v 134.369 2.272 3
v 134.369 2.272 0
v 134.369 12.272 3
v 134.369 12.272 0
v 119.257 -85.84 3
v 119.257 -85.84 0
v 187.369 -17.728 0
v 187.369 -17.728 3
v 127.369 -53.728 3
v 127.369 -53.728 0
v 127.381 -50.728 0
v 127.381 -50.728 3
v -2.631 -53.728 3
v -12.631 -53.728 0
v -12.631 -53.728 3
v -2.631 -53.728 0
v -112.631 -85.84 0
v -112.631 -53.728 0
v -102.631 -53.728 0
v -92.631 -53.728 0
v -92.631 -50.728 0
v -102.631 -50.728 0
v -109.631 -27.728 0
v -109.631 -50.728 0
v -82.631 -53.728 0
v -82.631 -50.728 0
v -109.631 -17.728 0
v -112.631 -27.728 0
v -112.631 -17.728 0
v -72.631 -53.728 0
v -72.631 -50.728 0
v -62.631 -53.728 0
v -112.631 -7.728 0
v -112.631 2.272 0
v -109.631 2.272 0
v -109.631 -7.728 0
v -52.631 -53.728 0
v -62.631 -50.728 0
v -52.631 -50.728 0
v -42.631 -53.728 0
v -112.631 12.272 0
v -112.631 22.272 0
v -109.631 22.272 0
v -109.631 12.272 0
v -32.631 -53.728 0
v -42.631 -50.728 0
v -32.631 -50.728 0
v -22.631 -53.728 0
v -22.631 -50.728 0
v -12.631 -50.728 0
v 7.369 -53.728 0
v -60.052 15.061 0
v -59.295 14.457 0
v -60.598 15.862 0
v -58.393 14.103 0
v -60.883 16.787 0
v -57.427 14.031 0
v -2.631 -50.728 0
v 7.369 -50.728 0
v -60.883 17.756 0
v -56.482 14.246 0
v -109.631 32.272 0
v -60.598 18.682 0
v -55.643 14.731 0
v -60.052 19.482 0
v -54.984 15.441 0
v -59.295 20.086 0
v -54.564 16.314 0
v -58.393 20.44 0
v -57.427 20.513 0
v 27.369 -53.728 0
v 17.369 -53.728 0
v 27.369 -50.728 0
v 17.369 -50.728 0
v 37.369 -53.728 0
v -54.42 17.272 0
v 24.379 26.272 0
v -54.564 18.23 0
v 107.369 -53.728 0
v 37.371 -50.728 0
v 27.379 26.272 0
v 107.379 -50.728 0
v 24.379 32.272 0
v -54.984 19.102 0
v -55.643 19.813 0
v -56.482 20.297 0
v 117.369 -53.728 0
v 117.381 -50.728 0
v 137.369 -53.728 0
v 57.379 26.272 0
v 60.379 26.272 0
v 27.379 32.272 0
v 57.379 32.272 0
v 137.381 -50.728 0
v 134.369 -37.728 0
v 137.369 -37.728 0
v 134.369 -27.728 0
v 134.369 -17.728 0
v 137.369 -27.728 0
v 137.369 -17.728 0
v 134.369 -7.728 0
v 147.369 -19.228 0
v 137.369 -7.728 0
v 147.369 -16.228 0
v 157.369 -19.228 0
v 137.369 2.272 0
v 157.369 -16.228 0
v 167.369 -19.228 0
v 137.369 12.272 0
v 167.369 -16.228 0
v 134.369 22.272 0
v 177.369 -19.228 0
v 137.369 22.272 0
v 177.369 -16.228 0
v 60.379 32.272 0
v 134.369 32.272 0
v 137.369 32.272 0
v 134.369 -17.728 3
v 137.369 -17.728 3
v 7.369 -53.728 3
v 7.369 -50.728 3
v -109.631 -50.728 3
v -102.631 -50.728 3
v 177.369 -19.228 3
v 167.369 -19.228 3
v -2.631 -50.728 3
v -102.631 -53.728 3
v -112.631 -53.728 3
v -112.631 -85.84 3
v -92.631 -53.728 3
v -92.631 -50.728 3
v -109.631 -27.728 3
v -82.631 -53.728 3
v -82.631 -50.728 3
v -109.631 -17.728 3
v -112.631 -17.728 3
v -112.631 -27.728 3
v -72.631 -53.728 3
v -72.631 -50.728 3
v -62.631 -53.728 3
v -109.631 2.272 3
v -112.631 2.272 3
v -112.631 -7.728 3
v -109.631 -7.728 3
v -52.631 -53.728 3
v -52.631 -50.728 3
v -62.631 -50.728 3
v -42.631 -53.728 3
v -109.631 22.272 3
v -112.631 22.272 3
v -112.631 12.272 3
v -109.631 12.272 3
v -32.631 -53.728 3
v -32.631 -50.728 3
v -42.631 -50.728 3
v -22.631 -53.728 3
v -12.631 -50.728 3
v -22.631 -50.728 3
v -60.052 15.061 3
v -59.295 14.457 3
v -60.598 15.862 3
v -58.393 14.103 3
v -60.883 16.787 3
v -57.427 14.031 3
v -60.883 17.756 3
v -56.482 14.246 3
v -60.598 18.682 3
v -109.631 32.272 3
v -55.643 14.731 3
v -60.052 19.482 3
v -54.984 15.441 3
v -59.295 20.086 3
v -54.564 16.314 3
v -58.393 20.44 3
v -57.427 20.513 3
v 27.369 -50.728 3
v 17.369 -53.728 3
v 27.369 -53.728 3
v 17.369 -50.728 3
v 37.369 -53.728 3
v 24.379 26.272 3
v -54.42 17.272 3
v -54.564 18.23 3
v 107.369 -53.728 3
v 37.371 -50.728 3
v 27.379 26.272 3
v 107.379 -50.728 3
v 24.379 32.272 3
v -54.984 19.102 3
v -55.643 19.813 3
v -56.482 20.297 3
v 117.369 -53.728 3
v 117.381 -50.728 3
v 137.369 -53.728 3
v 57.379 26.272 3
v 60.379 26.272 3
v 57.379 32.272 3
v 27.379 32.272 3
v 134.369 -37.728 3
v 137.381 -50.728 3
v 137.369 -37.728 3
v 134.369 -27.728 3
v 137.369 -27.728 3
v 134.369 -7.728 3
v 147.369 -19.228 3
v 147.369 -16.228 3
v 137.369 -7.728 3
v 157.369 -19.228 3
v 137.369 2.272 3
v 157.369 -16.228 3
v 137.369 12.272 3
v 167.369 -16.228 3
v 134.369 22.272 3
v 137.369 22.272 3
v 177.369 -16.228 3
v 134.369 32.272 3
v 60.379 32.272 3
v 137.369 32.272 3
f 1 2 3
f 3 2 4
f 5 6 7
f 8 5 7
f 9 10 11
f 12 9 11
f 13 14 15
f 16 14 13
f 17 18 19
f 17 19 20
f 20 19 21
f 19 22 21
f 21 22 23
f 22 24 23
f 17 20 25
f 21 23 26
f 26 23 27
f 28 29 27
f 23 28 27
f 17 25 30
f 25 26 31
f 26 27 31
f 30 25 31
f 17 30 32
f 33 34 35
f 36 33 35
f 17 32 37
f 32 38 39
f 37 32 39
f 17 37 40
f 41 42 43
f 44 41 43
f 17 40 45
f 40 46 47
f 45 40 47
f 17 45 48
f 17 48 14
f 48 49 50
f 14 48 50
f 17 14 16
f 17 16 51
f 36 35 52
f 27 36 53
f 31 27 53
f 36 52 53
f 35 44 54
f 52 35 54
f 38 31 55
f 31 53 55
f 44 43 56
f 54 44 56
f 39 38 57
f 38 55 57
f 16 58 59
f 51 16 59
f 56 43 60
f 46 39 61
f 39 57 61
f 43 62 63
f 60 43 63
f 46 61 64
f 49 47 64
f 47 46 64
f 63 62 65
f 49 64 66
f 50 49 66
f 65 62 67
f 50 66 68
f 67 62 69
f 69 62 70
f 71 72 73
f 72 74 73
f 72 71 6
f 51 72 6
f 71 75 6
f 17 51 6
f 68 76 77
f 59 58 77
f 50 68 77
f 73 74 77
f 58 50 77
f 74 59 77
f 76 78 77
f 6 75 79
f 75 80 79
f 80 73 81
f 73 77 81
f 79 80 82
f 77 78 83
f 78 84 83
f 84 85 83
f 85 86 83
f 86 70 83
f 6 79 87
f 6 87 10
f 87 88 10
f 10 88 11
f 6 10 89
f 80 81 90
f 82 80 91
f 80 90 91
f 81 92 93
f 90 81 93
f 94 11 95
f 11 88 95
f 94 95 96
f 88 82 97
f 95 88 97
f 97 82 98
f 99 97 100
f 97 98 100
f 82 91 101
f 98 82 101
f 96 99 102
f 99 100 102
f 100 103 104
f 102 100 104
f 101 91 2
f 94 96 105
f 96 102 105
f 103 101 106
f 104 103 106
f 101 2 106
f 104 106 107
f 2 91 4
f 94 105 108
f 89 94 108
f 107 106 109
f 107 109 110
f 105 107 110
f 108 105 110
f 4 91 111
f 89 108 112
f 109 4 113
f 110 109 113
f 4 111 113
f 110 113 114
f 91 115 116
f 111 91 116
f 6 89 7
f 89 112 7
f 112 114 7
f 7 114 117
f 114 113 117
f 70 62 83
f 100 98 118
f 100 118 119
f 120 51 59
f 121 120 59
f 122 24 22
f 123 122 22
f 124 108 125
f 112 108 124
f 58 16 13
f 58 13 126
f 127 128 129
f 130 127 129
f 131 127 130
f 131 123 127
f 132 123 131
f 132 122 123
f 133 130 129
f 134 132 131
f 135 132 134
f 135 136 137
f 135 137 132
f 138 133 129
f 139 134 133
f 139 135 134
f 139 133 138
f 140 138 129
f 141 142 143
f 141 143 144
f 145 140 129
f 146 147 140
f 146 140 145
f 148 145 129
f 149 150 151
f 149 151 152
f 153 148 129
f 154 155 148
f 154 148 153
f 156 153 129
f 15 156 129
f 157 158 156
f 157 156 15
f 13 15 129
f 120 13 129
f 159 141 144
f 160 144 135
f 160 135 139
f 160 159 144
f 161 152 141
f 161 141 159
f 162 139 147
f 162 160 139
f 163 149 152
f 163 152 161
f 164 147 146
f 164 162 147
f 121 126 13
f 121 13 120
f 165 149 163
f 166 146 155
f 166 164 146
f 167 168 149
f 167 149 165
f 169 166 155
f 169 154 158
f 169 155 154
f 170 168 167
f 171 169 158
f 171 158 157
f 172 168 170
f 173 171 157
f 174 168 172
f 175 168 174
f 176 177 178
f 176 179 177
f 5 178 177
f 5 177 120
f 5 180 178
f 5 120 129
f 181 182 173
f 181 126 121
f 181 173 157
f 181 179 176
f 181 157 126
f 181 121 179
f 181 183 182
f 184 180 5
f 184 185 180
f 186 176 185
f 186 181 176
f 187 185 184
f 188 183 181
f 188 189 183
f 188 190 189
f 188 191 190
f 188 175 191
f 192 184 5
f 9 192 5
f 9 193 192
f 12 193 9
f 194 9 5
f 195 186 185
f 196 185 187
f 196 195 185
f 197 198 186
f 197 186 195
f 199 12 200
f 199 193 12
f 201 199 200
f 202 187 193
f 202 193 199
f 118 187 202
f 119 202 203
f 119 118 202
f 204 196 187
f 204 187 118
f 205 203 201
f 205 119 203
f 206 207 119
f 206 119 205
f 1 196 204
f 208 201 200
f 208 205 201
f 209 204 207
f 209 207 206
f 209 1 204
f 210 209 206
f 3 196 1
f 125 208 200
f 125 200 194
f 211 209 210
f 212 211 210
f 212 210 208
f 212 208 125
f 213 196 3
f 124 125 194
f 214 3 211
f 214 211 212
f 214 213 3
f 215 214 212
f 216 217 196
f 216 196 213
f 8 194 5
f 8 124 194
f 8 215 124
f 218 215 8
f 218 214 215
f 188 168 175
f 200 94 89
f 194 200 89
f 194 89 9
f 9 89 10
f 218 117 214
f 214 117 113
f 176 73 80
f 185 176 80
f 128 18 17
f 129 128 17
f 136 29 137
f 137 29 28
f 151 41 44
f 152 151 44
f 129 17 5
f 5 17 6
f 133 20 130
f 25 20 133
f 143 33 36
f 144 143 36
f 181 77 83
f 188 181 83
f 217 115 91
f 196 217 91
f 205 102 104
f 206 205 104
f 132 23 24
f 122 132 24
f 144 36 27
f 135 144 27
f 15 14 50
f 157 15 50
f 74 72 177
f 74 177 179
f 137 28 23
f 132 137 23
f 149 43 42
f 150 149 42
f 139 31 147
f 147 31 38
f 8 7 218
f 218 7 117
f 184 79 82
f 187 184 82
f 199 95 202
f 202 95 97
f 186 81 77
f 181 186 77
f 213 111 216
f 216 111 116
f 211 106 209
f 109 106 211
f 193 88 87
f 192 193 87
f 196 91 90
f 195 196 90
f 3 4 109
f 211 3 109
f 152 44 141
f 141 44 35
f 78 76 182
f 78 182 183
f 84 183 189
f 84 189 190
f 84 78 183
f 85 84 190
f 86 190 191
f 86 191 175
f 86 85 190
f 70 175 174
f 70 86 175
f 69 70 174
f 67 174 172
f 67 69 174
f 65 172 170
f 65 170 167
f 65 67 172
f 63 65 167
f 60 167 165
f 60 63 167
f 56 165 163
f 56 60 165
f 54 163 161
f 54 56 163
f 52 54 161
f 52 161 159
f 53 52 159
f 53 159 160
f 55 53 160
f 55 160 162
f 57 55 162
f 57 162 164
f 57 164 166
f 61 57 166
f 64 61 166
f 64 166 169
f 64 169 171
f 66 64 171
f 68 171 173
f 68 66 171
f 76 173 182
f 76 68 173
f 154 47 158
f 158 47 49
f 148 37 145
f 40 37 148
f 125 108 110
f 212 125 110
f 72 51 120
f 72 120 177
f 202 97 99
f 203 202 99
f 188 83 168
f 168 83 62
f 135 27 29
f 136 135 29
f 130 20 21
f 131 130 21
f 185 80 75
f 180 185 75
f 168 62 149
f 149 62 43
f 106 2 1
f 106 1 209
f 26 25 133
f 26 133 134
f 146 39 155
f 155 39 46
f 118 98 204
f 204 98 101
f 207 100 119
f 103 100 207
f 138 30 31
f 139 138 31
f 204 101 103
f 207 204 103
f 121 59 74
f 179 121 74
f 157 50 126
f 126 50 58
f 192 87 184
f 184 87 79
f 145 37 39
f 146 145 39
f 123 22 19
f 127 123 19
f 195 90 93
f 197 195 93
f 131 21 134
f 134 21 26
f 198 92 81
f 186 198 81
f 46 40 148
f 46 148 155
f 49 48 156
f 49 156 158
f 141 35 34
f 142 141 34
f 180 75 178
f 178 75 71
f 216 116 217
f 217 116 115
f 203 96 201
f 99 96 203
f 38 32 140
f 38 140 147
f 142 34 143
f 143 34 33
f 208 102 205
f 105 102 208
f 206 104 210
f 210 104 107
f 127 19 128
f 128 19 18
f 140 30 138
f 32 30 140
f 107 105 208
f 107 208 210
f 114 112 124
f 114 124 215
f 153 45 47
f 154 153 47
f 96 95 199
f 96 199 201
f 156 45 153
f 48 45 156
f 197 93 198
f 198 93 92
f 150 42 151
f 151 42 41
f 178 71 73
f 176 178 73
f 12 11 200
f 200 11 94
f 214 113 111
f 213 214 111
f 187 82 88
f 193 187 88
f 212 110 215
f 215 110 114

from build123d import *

# Parameters (mm, degrees)
SKETCH1_W           = 10
SKETCH1_H           = 3
SKETCH1_W_2         = 3
SKETCH1_H_2         = 10
SKETCH1_R           = 3.25
BOSS_EXTRUDE1_DEPTH = 3


with BuildPart() as part:
    # Sketch1 → Boss-Extrude1 (new body)
    with BuildSketch(Plane.XY):
        Polygon((-112.631023813, -53.728350242), (-112.631023813, -63.840272517), (-112.631023813, -85.840272517), (119.257053912, -85.840272517), (137.368976187, -67.728350242), (187.368976187, -17.728350242), (137.368976187, 32.271649758), (137.368976187, 22.271649758), (134.368976187, 22.271649758), (134.368976187, 32.271649758), (60.378976187, 32.271649758), (60.378976187, 26.271649758), (57.378976187, 26.271649758), (57.378976187, 32.271649758), (42.378976187, 32.271649758), (27.378976187, 32.271649758), (27.378976187, 26.271649758), (24.378976187, 26.271649758), (24.378976187, 32.271649758), (-62.631023813, 32.271649758), (-109.631023813, 32.271649758), (-109.631023813, 22.271649758), (-112.631023813, 22.271649758), (-112.631023813, 12.271649758), (-109.631023813, 12.271649758), (-109.631023813, 2.271649758), (-112.631023813, 2.271649758), (-112.631023813, -7.728350242), (-109.631023813, -7.728350242), (-109.631023813, -17.728350242), (-112.631023813, -17.728350242), (-112.631023813, -27.728350242), (-109.631023813, -27.728350242), (-109.631023813, -50.728350242), (-102.631023813, -50.728350242), (-102.631023813, -53.728350242), align=None)
        with Locations((-87.631023813, -52.228350242)):
            Rectangle(SKETCH1_W, SKETCH1_H, mode=Mode.SUBTRACT)
        with Locations((-67.631023813, -52.228350242)):
            Rectangle(SKETCH1_W, SKETCH1_H, mode=Mode.SUBTRACT)
        with Locations((-47.631023813, -52.228350242)):
            Rectangle(SKETCH1_W, SKETCH1_H, mode=Mode.SUBTRACT)
        with Locations((-27.631023813, -52.228350242)):
            Rectangle(SKETCH1_W, SKETCH1_H, mode=Mode.SUBTRACT)
        with Locations((-7.631023813, -52.228350242)):
            Rectangle(SKETCH1_W, SKETCH1_H, mode=Mode.SUBTRACT)
        with Locations((12.368976187, -52.228350242)):
            Rectangle(SKETCH1_W, SKETCH1_H, mode=Mode.SUBTRACT)
        Polygon((27.368976187, -50.728350242), (37.371405326, -50.728350242), (37.368976187, -53.728350242), (27.368976187, -53.728350242), align=None, mode=Mode.SUBTRACT)
        Polygon((107.3787447, -50.728350242), (117.381121881, -50.728350242), (117.369073889, -53.728350242), (107.369073889, -53.728350242), align=None, mode=Mode.SUBTRACT)
        Polygon((127.381202522, -50.728350242), (137.381202522, -50.728350242), (137.36915453, -53.728350242), (127.36915453, -53.728350242), align=None, mode=Mode.SUBTRACT)
        with Locations((135.868976187, -32.728350242)):
            Rectangle(SKETCH1_W_2, SKETCH1_H_2, mode=Mode.SUBTRACT)
        with Locations((-57.669534365, 17.271649758)):
            Circle(SKETCH1_R, mode=Mode.SUBTRACT)
        with Locations((135.868976187, -12.728350242)):
            Rectangle(SKETCH1_W_2, SKETCH1_H_2, mode=Mode.SUBTRACT)
        with Locations((152.368976187, -17.728350242)):
            Rectangle(SKETCH1_W, SKETCH1_H, mode=Mode.SUBTRACT)
        with Locations((172.368976187, -17.728350242)):
            Rectangle(SKETCH1_W, SKETCH1_H, mode=Mode.SUBTRACT)
        with Locations((135.868976187, 7.271649758)):
            Rectangle(SKETCH1_W_2, SKETCH1_H_2, mode=Mode.SUBTRACT)
    extrude(amount=BOSS_EXTRUDE1_DEPTH)


solid = part.part
